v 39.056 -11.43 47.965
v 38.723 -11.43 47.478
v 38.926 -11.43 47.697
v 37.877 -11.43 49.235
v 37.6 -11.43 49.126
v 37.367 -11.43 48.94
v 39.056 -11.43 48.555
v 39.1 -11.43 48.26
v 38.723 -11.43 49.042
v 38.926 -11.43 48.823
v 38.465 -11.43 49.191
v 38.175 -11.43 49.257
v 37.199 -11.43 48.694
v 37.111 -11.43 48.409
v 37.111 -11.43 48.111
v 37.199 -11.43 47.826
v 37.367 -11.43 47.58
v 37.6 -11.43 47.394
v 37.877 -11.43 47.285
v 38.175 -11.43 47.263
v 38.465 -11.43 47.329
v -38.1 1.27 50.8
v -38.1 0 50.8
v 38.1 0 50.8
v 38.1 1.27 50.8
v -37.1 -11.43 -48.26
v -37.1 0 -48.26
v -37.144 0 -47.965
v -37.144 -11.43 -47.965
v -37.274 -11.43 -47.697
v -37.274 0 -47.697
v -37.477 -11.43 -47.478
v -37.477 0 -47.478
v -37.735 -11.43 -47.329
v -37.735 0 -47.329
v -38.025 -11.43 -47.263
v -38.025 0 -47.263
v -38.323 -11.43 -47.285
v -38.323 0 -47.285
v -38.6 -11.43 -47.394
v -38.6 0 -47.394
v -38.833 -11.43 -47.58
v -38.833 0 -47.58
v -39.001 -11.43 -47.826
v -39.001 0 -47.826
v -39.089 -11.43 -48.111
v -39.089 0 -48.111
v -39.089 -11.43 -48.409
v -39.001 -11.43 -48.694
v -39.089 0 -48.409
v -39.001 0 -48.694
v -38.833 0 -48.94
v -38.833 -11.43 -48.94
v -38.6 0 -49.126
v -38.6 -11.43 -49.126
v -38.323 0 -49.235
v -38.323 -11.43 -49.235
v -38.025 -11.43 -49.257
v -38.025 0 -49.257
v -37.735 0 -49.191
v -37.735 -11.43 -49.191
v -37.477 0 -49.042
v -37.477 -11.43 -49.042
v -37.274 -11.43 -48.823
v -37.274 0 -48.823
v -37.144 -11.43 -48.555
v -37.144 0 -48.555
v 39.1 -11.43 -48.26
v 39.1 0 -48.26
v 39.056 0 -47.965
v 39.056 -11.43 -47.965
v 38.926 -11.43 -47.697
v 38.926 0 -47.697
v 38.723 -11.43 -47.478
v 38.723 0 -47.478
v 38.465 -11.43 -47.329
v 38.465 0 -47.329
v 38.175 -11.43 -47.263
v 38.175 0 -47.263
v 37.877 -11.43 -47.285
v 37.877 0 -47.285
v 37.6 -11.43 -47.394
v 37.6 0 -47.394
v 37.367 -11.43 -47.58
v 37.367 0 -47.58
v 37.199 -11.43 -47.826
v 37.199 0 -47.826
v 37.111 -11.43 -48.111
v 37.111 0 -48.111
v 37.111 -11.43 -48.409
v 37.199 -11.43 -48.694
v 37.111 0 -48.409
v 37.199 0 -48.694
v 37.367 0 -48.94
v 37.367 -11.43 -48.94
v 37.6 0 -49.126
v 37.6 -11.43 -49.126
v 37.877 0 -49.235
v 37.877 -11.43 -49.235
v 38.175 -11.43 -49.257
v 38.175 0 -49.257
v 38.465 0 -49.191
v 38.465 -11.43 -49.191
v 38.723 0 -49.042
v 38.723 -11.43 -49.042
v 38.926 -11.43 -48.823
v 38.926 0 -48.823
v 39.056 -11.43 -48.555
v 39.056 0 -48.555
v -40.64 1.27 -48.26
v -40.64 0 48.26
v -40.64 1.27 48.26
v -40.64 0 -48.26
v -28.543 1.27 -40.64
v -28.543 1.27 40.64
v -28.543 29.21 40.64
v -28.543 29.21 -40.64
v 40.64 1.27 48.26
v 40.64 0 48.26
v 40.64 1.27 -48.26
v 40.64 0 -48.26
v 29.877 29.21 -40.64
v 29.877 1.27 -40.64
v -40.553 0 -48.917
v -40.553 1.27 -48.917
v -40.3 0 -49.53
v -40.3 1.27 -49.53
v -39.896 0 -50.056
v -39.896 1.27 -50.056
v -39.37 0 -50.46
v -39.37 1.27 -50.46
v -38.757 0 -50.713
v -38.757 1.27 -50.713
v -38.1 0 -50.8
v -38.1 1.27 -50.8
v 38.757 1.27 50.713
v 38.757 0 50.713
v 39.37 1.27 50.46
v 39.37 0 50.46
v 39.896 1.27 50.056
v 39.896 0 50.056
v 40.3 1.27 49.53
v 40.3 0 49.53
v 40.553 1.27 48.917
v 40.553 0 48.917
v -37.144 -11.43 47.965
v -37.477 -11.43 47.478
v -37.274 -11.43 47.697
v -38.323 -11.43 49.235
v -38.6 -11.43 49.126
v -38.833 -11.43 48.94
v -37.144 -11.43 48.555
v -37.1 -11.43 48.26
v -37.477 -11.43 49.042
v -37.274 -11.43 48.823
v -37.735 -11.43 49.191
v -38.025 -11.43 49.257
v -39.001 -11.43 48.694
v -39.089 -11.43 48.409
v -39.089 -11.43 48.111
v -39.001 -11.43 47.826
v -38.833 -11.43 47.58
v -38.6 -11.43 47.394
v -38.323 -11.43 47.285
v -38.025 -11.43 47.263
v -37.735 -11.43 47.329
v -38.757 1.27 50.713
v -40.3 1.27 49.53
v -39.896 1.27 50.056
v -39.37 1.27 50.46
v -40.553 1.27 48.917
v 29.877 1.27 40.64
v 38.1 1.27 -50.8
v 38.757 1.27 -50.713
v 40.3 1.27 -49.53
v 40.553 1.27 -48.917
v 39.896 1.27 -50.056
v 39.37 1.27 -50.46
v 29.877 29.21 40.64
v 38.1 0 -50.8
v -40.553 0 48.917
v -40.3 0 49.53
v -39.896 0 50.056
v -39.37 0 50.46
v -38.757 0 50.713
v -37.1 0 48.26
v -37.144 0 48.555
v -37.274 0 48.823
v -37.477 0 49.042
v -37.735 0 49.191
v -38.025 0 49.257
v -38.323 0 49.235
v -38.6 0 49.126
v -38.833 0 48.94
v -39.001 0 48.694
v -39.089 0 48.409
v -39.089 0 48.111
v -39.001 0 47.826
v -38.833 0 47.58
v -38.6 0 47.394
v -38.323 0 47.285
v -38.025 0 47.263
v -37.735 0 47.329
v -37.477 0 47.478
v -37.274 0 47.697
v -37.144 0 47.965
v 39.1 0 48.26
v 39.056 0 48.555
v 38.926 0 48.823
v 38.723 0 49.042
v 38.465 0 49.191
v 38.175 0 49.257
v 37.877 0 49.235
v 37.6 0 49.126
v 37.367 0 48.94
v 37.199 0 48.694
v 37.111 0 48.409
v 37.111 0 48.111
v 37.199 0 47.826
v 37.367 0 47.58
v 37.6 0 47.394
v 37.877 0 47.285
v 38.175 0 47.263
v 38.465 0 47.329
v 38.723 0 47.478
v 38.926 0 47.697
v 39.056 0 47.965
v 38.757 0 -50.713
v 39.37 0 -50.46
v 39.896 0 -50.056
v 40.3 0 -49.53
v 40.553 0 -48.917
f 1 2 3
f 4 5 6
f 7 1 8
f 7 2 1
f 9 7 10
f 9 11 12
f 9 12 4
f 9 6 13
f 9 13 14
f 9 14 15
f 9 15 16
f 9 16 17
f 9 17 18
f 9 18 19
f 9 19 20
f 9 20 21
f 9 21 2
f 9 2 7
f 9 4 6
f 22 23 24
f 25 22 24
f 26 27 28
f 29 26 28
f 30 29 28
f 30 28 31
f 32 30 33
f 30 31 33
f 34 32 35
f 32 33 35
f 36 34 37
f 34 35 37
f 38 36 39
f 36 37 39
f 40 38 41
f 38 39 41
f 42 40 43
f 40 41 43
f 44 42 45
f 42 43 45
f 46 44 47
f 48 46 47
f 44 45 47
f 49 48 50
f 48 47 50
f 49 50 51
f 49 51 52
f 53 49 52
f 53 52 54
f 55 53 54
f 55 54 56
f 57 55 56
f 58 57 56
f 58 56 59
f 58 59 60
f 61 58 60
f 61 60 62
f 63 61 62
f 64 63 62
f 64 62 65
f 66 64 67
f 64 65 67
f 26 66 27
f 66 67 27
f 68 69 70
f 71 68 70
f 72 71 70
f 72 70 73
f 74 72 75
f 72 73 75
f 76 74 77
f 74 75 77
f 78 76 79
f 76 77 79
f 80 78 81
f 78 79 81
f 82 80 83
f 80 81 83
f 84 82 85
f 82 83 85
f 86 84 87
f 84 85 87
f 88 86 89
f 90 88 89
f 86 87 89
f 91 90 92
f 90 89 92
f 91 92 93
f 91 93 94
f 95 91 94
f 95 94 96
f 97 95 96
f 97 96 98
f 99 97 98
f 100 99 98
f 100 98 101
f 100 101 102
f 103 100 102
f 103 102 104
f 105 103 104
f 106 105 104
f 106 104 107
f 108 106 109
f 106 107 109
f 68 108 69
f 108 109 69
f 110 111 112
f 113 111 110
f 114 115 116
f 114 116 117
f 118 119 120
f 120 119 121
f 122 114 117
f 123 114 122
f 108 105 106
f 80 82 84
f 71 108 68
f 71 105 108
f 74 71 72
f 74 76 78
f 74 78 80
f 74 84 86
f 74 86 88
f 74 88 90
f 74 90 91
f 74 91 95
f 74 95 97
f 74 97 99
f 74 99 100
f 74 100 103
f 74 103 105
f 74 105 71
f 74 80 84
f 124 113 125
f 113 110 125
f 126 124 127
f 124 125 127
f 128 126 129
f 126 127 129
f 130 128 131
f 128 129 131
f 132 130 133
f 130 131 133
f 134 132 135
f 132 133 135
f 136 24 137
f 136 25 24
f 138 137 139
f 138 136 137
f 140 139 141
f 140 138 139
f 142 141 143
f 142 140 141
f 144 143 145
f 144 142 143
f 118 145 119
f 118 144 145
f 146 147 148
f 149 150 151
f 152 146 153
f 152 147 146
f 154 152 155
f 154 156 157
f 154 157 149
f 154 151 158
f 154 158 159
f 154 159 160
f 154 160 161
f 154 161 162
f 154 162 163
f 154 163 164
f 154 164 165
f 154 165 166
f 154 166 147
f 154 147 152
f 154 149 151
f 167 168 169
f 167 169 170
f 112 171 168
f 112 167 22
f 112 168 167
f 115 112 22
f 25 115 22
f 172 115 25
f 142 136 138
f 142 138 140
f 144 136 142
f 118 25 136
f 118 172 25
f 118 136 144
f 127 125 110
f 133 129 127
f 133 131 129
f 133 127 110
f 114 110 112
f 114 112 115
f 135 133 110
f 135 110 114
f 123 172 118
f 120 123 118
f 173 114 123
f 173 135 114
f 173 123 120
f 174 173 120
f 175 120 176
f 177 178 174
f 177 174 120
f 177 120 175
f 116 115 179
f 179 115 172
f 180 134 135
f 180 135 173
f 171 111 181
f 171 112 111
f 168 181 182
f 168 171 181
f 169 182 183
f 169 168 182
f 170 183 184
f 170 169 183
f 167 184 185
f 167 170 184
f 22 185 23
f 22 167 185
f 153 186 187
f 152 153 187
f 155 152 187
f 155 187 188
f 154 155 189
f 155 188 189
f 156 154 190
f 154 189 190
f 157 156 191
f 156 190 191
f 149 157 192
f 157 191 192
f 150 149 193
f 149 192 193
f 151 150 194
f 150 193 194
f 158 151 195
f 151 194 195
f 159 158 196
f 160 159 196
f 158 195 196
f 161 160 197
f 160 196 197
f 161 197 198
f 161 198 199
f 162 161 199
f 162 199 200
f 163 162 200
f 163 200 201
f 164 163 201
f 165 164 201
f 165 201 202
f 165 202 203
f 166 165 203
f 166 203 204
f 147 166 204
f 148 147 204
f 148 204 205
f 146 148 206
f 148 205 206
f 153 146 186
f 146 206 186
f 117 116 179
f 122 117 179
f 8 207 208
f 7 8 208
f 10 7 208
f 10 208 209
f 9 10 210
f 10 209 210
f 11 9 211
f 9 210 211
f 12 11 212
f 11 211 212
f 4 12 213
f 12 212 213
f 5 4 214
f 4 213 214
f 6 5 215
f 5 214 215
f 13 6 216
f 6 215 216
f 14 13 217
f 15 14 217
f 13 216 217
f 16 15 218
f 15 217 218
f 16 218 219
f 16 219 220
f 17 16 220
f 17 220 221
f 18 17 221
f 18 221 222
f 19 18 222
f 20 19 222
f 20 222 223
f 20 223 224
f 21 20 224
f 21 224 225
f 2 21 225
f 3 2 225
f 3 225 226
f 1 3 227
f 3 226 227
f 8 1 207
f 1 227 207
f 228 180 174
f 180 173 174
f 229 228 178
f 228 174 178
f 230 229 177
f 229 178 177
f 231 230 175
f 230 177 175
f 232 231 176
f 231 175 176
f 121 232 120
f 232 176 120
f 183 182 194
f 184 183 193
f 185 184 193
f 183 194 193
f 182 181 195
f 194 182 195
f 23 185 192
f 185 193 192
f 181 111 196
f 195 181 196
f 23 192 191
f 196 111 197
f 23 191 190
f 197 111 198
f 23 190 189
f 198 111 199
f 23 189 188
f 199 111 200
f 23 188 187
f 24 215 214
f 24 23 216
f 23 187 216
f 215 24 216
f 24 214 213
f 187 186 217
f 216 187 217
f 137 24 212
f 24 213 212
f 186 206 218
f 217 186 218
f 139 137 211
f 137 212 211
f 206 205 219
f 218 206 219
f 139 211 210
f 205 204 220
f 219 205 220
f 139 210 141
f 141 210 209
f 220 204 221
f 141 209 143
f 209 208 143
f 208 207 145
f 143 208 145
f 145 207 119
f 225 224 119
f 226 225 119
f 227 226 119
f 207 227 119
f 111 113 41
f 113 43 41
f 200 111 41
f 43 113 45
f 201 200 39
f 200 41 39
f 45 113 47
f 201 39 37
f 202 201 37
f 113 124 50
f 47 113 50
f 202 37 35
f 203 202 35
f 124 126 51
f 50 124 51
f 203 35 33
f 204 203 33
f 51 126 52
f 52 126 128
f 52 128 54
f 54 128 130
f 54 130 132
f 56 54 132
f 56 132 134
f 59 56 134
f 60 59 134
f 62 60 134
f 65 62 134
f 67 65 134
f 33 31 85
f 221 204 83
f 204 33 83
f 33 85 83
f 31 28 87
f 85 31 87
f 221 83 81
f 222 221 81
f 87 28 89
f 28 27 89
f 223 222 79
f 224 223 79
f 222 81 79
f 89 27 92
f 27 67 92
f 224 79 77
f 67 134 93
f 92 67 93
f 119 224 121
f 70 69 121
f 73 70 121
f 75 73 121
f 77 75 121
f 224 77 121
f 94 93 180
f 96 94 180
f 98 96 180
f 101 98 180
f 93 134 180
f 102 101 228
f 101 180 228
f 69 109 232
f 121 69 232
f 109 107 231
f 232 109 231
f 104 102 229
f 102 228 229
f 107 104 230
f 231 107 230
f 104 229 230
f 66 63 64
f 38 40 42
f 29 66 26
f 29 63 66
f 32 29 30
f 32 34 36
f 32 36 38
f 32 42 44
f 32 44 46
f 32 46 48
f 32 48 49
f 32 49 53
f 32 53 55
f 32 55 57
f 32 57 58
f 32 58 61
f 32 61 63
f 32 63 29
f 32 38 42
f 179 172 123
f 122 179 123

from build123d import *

# Parameters (mm, degrees)
SKETCH1_W           = 81.28
SKETCH1_H           = 101.6
BOSS_EXTRUDE1_DEPTH = 1.27
SKETCH2_W           = 58.42
SKETCH2_H           = 81.28
BOSS_EXTRUDE2_DEPTH = 27.94
FILLET1_R           = 2.54
SKETCH4_R           = 1
BOSS_EXTRUDE3_DEPTH = 11.43


with BuildPart() as part:
    # Sketch1 → Boss-Extrude1 (new body)
    with BuildSketch(Plane(origin=(0, 0, 0), x_dir=(1, 0, 0), z_dir=(0, 1, 0))):
        Rectangle(SKETCH1_W, SKETCH1_H)
    extrude(amount=BOSS_EXTRUDE1_DEPTH)

    # Sketch2 → Boss-Extrude2 (add)
    with BuildSketch(Plane(origin=(0, 1.27, 0), x_dir=(1, 0, 0), z_dir=(0, 1, 0))):
        with Locations((0.667132778, 0)):
            Rectangle(SKETCH2_W, SKETCH2_H)
    extrude(amount=BOSS_EXTRUDE2_DEPTH)

    # Fillet1
    fillet1_edges = [part.edges().sort_by_distance(p)[0] for p in [
        (40.64, 0.635, 50.8),
        (-40.64, 0.635, 50.8),
        (-40.64, 0.635, -50.8),
        (40.64, 0.635, -50.8),
    ]]
    fillet(fillet1_edges, radius=FILLET1_R)

    # Sketch4 → Boss-Extrude3 (add)
    with BuildSketch(Plane.XZ):
        with Locations((38.1, 48.26)):
            Circle(SKETCH4_R)
        with Locations((38.1, -48.26)):
            Circle(SKETCH4_R)
        with Locations((-38.1, 48.26)):
            Circle(SKETCH4_R)
        with Locations((-38.1, -48.26)):
            Circle(SKETCH4_R)
    extrude(amount=BOSS_EXTRUDE3_DEPTH)


solid = part.part
